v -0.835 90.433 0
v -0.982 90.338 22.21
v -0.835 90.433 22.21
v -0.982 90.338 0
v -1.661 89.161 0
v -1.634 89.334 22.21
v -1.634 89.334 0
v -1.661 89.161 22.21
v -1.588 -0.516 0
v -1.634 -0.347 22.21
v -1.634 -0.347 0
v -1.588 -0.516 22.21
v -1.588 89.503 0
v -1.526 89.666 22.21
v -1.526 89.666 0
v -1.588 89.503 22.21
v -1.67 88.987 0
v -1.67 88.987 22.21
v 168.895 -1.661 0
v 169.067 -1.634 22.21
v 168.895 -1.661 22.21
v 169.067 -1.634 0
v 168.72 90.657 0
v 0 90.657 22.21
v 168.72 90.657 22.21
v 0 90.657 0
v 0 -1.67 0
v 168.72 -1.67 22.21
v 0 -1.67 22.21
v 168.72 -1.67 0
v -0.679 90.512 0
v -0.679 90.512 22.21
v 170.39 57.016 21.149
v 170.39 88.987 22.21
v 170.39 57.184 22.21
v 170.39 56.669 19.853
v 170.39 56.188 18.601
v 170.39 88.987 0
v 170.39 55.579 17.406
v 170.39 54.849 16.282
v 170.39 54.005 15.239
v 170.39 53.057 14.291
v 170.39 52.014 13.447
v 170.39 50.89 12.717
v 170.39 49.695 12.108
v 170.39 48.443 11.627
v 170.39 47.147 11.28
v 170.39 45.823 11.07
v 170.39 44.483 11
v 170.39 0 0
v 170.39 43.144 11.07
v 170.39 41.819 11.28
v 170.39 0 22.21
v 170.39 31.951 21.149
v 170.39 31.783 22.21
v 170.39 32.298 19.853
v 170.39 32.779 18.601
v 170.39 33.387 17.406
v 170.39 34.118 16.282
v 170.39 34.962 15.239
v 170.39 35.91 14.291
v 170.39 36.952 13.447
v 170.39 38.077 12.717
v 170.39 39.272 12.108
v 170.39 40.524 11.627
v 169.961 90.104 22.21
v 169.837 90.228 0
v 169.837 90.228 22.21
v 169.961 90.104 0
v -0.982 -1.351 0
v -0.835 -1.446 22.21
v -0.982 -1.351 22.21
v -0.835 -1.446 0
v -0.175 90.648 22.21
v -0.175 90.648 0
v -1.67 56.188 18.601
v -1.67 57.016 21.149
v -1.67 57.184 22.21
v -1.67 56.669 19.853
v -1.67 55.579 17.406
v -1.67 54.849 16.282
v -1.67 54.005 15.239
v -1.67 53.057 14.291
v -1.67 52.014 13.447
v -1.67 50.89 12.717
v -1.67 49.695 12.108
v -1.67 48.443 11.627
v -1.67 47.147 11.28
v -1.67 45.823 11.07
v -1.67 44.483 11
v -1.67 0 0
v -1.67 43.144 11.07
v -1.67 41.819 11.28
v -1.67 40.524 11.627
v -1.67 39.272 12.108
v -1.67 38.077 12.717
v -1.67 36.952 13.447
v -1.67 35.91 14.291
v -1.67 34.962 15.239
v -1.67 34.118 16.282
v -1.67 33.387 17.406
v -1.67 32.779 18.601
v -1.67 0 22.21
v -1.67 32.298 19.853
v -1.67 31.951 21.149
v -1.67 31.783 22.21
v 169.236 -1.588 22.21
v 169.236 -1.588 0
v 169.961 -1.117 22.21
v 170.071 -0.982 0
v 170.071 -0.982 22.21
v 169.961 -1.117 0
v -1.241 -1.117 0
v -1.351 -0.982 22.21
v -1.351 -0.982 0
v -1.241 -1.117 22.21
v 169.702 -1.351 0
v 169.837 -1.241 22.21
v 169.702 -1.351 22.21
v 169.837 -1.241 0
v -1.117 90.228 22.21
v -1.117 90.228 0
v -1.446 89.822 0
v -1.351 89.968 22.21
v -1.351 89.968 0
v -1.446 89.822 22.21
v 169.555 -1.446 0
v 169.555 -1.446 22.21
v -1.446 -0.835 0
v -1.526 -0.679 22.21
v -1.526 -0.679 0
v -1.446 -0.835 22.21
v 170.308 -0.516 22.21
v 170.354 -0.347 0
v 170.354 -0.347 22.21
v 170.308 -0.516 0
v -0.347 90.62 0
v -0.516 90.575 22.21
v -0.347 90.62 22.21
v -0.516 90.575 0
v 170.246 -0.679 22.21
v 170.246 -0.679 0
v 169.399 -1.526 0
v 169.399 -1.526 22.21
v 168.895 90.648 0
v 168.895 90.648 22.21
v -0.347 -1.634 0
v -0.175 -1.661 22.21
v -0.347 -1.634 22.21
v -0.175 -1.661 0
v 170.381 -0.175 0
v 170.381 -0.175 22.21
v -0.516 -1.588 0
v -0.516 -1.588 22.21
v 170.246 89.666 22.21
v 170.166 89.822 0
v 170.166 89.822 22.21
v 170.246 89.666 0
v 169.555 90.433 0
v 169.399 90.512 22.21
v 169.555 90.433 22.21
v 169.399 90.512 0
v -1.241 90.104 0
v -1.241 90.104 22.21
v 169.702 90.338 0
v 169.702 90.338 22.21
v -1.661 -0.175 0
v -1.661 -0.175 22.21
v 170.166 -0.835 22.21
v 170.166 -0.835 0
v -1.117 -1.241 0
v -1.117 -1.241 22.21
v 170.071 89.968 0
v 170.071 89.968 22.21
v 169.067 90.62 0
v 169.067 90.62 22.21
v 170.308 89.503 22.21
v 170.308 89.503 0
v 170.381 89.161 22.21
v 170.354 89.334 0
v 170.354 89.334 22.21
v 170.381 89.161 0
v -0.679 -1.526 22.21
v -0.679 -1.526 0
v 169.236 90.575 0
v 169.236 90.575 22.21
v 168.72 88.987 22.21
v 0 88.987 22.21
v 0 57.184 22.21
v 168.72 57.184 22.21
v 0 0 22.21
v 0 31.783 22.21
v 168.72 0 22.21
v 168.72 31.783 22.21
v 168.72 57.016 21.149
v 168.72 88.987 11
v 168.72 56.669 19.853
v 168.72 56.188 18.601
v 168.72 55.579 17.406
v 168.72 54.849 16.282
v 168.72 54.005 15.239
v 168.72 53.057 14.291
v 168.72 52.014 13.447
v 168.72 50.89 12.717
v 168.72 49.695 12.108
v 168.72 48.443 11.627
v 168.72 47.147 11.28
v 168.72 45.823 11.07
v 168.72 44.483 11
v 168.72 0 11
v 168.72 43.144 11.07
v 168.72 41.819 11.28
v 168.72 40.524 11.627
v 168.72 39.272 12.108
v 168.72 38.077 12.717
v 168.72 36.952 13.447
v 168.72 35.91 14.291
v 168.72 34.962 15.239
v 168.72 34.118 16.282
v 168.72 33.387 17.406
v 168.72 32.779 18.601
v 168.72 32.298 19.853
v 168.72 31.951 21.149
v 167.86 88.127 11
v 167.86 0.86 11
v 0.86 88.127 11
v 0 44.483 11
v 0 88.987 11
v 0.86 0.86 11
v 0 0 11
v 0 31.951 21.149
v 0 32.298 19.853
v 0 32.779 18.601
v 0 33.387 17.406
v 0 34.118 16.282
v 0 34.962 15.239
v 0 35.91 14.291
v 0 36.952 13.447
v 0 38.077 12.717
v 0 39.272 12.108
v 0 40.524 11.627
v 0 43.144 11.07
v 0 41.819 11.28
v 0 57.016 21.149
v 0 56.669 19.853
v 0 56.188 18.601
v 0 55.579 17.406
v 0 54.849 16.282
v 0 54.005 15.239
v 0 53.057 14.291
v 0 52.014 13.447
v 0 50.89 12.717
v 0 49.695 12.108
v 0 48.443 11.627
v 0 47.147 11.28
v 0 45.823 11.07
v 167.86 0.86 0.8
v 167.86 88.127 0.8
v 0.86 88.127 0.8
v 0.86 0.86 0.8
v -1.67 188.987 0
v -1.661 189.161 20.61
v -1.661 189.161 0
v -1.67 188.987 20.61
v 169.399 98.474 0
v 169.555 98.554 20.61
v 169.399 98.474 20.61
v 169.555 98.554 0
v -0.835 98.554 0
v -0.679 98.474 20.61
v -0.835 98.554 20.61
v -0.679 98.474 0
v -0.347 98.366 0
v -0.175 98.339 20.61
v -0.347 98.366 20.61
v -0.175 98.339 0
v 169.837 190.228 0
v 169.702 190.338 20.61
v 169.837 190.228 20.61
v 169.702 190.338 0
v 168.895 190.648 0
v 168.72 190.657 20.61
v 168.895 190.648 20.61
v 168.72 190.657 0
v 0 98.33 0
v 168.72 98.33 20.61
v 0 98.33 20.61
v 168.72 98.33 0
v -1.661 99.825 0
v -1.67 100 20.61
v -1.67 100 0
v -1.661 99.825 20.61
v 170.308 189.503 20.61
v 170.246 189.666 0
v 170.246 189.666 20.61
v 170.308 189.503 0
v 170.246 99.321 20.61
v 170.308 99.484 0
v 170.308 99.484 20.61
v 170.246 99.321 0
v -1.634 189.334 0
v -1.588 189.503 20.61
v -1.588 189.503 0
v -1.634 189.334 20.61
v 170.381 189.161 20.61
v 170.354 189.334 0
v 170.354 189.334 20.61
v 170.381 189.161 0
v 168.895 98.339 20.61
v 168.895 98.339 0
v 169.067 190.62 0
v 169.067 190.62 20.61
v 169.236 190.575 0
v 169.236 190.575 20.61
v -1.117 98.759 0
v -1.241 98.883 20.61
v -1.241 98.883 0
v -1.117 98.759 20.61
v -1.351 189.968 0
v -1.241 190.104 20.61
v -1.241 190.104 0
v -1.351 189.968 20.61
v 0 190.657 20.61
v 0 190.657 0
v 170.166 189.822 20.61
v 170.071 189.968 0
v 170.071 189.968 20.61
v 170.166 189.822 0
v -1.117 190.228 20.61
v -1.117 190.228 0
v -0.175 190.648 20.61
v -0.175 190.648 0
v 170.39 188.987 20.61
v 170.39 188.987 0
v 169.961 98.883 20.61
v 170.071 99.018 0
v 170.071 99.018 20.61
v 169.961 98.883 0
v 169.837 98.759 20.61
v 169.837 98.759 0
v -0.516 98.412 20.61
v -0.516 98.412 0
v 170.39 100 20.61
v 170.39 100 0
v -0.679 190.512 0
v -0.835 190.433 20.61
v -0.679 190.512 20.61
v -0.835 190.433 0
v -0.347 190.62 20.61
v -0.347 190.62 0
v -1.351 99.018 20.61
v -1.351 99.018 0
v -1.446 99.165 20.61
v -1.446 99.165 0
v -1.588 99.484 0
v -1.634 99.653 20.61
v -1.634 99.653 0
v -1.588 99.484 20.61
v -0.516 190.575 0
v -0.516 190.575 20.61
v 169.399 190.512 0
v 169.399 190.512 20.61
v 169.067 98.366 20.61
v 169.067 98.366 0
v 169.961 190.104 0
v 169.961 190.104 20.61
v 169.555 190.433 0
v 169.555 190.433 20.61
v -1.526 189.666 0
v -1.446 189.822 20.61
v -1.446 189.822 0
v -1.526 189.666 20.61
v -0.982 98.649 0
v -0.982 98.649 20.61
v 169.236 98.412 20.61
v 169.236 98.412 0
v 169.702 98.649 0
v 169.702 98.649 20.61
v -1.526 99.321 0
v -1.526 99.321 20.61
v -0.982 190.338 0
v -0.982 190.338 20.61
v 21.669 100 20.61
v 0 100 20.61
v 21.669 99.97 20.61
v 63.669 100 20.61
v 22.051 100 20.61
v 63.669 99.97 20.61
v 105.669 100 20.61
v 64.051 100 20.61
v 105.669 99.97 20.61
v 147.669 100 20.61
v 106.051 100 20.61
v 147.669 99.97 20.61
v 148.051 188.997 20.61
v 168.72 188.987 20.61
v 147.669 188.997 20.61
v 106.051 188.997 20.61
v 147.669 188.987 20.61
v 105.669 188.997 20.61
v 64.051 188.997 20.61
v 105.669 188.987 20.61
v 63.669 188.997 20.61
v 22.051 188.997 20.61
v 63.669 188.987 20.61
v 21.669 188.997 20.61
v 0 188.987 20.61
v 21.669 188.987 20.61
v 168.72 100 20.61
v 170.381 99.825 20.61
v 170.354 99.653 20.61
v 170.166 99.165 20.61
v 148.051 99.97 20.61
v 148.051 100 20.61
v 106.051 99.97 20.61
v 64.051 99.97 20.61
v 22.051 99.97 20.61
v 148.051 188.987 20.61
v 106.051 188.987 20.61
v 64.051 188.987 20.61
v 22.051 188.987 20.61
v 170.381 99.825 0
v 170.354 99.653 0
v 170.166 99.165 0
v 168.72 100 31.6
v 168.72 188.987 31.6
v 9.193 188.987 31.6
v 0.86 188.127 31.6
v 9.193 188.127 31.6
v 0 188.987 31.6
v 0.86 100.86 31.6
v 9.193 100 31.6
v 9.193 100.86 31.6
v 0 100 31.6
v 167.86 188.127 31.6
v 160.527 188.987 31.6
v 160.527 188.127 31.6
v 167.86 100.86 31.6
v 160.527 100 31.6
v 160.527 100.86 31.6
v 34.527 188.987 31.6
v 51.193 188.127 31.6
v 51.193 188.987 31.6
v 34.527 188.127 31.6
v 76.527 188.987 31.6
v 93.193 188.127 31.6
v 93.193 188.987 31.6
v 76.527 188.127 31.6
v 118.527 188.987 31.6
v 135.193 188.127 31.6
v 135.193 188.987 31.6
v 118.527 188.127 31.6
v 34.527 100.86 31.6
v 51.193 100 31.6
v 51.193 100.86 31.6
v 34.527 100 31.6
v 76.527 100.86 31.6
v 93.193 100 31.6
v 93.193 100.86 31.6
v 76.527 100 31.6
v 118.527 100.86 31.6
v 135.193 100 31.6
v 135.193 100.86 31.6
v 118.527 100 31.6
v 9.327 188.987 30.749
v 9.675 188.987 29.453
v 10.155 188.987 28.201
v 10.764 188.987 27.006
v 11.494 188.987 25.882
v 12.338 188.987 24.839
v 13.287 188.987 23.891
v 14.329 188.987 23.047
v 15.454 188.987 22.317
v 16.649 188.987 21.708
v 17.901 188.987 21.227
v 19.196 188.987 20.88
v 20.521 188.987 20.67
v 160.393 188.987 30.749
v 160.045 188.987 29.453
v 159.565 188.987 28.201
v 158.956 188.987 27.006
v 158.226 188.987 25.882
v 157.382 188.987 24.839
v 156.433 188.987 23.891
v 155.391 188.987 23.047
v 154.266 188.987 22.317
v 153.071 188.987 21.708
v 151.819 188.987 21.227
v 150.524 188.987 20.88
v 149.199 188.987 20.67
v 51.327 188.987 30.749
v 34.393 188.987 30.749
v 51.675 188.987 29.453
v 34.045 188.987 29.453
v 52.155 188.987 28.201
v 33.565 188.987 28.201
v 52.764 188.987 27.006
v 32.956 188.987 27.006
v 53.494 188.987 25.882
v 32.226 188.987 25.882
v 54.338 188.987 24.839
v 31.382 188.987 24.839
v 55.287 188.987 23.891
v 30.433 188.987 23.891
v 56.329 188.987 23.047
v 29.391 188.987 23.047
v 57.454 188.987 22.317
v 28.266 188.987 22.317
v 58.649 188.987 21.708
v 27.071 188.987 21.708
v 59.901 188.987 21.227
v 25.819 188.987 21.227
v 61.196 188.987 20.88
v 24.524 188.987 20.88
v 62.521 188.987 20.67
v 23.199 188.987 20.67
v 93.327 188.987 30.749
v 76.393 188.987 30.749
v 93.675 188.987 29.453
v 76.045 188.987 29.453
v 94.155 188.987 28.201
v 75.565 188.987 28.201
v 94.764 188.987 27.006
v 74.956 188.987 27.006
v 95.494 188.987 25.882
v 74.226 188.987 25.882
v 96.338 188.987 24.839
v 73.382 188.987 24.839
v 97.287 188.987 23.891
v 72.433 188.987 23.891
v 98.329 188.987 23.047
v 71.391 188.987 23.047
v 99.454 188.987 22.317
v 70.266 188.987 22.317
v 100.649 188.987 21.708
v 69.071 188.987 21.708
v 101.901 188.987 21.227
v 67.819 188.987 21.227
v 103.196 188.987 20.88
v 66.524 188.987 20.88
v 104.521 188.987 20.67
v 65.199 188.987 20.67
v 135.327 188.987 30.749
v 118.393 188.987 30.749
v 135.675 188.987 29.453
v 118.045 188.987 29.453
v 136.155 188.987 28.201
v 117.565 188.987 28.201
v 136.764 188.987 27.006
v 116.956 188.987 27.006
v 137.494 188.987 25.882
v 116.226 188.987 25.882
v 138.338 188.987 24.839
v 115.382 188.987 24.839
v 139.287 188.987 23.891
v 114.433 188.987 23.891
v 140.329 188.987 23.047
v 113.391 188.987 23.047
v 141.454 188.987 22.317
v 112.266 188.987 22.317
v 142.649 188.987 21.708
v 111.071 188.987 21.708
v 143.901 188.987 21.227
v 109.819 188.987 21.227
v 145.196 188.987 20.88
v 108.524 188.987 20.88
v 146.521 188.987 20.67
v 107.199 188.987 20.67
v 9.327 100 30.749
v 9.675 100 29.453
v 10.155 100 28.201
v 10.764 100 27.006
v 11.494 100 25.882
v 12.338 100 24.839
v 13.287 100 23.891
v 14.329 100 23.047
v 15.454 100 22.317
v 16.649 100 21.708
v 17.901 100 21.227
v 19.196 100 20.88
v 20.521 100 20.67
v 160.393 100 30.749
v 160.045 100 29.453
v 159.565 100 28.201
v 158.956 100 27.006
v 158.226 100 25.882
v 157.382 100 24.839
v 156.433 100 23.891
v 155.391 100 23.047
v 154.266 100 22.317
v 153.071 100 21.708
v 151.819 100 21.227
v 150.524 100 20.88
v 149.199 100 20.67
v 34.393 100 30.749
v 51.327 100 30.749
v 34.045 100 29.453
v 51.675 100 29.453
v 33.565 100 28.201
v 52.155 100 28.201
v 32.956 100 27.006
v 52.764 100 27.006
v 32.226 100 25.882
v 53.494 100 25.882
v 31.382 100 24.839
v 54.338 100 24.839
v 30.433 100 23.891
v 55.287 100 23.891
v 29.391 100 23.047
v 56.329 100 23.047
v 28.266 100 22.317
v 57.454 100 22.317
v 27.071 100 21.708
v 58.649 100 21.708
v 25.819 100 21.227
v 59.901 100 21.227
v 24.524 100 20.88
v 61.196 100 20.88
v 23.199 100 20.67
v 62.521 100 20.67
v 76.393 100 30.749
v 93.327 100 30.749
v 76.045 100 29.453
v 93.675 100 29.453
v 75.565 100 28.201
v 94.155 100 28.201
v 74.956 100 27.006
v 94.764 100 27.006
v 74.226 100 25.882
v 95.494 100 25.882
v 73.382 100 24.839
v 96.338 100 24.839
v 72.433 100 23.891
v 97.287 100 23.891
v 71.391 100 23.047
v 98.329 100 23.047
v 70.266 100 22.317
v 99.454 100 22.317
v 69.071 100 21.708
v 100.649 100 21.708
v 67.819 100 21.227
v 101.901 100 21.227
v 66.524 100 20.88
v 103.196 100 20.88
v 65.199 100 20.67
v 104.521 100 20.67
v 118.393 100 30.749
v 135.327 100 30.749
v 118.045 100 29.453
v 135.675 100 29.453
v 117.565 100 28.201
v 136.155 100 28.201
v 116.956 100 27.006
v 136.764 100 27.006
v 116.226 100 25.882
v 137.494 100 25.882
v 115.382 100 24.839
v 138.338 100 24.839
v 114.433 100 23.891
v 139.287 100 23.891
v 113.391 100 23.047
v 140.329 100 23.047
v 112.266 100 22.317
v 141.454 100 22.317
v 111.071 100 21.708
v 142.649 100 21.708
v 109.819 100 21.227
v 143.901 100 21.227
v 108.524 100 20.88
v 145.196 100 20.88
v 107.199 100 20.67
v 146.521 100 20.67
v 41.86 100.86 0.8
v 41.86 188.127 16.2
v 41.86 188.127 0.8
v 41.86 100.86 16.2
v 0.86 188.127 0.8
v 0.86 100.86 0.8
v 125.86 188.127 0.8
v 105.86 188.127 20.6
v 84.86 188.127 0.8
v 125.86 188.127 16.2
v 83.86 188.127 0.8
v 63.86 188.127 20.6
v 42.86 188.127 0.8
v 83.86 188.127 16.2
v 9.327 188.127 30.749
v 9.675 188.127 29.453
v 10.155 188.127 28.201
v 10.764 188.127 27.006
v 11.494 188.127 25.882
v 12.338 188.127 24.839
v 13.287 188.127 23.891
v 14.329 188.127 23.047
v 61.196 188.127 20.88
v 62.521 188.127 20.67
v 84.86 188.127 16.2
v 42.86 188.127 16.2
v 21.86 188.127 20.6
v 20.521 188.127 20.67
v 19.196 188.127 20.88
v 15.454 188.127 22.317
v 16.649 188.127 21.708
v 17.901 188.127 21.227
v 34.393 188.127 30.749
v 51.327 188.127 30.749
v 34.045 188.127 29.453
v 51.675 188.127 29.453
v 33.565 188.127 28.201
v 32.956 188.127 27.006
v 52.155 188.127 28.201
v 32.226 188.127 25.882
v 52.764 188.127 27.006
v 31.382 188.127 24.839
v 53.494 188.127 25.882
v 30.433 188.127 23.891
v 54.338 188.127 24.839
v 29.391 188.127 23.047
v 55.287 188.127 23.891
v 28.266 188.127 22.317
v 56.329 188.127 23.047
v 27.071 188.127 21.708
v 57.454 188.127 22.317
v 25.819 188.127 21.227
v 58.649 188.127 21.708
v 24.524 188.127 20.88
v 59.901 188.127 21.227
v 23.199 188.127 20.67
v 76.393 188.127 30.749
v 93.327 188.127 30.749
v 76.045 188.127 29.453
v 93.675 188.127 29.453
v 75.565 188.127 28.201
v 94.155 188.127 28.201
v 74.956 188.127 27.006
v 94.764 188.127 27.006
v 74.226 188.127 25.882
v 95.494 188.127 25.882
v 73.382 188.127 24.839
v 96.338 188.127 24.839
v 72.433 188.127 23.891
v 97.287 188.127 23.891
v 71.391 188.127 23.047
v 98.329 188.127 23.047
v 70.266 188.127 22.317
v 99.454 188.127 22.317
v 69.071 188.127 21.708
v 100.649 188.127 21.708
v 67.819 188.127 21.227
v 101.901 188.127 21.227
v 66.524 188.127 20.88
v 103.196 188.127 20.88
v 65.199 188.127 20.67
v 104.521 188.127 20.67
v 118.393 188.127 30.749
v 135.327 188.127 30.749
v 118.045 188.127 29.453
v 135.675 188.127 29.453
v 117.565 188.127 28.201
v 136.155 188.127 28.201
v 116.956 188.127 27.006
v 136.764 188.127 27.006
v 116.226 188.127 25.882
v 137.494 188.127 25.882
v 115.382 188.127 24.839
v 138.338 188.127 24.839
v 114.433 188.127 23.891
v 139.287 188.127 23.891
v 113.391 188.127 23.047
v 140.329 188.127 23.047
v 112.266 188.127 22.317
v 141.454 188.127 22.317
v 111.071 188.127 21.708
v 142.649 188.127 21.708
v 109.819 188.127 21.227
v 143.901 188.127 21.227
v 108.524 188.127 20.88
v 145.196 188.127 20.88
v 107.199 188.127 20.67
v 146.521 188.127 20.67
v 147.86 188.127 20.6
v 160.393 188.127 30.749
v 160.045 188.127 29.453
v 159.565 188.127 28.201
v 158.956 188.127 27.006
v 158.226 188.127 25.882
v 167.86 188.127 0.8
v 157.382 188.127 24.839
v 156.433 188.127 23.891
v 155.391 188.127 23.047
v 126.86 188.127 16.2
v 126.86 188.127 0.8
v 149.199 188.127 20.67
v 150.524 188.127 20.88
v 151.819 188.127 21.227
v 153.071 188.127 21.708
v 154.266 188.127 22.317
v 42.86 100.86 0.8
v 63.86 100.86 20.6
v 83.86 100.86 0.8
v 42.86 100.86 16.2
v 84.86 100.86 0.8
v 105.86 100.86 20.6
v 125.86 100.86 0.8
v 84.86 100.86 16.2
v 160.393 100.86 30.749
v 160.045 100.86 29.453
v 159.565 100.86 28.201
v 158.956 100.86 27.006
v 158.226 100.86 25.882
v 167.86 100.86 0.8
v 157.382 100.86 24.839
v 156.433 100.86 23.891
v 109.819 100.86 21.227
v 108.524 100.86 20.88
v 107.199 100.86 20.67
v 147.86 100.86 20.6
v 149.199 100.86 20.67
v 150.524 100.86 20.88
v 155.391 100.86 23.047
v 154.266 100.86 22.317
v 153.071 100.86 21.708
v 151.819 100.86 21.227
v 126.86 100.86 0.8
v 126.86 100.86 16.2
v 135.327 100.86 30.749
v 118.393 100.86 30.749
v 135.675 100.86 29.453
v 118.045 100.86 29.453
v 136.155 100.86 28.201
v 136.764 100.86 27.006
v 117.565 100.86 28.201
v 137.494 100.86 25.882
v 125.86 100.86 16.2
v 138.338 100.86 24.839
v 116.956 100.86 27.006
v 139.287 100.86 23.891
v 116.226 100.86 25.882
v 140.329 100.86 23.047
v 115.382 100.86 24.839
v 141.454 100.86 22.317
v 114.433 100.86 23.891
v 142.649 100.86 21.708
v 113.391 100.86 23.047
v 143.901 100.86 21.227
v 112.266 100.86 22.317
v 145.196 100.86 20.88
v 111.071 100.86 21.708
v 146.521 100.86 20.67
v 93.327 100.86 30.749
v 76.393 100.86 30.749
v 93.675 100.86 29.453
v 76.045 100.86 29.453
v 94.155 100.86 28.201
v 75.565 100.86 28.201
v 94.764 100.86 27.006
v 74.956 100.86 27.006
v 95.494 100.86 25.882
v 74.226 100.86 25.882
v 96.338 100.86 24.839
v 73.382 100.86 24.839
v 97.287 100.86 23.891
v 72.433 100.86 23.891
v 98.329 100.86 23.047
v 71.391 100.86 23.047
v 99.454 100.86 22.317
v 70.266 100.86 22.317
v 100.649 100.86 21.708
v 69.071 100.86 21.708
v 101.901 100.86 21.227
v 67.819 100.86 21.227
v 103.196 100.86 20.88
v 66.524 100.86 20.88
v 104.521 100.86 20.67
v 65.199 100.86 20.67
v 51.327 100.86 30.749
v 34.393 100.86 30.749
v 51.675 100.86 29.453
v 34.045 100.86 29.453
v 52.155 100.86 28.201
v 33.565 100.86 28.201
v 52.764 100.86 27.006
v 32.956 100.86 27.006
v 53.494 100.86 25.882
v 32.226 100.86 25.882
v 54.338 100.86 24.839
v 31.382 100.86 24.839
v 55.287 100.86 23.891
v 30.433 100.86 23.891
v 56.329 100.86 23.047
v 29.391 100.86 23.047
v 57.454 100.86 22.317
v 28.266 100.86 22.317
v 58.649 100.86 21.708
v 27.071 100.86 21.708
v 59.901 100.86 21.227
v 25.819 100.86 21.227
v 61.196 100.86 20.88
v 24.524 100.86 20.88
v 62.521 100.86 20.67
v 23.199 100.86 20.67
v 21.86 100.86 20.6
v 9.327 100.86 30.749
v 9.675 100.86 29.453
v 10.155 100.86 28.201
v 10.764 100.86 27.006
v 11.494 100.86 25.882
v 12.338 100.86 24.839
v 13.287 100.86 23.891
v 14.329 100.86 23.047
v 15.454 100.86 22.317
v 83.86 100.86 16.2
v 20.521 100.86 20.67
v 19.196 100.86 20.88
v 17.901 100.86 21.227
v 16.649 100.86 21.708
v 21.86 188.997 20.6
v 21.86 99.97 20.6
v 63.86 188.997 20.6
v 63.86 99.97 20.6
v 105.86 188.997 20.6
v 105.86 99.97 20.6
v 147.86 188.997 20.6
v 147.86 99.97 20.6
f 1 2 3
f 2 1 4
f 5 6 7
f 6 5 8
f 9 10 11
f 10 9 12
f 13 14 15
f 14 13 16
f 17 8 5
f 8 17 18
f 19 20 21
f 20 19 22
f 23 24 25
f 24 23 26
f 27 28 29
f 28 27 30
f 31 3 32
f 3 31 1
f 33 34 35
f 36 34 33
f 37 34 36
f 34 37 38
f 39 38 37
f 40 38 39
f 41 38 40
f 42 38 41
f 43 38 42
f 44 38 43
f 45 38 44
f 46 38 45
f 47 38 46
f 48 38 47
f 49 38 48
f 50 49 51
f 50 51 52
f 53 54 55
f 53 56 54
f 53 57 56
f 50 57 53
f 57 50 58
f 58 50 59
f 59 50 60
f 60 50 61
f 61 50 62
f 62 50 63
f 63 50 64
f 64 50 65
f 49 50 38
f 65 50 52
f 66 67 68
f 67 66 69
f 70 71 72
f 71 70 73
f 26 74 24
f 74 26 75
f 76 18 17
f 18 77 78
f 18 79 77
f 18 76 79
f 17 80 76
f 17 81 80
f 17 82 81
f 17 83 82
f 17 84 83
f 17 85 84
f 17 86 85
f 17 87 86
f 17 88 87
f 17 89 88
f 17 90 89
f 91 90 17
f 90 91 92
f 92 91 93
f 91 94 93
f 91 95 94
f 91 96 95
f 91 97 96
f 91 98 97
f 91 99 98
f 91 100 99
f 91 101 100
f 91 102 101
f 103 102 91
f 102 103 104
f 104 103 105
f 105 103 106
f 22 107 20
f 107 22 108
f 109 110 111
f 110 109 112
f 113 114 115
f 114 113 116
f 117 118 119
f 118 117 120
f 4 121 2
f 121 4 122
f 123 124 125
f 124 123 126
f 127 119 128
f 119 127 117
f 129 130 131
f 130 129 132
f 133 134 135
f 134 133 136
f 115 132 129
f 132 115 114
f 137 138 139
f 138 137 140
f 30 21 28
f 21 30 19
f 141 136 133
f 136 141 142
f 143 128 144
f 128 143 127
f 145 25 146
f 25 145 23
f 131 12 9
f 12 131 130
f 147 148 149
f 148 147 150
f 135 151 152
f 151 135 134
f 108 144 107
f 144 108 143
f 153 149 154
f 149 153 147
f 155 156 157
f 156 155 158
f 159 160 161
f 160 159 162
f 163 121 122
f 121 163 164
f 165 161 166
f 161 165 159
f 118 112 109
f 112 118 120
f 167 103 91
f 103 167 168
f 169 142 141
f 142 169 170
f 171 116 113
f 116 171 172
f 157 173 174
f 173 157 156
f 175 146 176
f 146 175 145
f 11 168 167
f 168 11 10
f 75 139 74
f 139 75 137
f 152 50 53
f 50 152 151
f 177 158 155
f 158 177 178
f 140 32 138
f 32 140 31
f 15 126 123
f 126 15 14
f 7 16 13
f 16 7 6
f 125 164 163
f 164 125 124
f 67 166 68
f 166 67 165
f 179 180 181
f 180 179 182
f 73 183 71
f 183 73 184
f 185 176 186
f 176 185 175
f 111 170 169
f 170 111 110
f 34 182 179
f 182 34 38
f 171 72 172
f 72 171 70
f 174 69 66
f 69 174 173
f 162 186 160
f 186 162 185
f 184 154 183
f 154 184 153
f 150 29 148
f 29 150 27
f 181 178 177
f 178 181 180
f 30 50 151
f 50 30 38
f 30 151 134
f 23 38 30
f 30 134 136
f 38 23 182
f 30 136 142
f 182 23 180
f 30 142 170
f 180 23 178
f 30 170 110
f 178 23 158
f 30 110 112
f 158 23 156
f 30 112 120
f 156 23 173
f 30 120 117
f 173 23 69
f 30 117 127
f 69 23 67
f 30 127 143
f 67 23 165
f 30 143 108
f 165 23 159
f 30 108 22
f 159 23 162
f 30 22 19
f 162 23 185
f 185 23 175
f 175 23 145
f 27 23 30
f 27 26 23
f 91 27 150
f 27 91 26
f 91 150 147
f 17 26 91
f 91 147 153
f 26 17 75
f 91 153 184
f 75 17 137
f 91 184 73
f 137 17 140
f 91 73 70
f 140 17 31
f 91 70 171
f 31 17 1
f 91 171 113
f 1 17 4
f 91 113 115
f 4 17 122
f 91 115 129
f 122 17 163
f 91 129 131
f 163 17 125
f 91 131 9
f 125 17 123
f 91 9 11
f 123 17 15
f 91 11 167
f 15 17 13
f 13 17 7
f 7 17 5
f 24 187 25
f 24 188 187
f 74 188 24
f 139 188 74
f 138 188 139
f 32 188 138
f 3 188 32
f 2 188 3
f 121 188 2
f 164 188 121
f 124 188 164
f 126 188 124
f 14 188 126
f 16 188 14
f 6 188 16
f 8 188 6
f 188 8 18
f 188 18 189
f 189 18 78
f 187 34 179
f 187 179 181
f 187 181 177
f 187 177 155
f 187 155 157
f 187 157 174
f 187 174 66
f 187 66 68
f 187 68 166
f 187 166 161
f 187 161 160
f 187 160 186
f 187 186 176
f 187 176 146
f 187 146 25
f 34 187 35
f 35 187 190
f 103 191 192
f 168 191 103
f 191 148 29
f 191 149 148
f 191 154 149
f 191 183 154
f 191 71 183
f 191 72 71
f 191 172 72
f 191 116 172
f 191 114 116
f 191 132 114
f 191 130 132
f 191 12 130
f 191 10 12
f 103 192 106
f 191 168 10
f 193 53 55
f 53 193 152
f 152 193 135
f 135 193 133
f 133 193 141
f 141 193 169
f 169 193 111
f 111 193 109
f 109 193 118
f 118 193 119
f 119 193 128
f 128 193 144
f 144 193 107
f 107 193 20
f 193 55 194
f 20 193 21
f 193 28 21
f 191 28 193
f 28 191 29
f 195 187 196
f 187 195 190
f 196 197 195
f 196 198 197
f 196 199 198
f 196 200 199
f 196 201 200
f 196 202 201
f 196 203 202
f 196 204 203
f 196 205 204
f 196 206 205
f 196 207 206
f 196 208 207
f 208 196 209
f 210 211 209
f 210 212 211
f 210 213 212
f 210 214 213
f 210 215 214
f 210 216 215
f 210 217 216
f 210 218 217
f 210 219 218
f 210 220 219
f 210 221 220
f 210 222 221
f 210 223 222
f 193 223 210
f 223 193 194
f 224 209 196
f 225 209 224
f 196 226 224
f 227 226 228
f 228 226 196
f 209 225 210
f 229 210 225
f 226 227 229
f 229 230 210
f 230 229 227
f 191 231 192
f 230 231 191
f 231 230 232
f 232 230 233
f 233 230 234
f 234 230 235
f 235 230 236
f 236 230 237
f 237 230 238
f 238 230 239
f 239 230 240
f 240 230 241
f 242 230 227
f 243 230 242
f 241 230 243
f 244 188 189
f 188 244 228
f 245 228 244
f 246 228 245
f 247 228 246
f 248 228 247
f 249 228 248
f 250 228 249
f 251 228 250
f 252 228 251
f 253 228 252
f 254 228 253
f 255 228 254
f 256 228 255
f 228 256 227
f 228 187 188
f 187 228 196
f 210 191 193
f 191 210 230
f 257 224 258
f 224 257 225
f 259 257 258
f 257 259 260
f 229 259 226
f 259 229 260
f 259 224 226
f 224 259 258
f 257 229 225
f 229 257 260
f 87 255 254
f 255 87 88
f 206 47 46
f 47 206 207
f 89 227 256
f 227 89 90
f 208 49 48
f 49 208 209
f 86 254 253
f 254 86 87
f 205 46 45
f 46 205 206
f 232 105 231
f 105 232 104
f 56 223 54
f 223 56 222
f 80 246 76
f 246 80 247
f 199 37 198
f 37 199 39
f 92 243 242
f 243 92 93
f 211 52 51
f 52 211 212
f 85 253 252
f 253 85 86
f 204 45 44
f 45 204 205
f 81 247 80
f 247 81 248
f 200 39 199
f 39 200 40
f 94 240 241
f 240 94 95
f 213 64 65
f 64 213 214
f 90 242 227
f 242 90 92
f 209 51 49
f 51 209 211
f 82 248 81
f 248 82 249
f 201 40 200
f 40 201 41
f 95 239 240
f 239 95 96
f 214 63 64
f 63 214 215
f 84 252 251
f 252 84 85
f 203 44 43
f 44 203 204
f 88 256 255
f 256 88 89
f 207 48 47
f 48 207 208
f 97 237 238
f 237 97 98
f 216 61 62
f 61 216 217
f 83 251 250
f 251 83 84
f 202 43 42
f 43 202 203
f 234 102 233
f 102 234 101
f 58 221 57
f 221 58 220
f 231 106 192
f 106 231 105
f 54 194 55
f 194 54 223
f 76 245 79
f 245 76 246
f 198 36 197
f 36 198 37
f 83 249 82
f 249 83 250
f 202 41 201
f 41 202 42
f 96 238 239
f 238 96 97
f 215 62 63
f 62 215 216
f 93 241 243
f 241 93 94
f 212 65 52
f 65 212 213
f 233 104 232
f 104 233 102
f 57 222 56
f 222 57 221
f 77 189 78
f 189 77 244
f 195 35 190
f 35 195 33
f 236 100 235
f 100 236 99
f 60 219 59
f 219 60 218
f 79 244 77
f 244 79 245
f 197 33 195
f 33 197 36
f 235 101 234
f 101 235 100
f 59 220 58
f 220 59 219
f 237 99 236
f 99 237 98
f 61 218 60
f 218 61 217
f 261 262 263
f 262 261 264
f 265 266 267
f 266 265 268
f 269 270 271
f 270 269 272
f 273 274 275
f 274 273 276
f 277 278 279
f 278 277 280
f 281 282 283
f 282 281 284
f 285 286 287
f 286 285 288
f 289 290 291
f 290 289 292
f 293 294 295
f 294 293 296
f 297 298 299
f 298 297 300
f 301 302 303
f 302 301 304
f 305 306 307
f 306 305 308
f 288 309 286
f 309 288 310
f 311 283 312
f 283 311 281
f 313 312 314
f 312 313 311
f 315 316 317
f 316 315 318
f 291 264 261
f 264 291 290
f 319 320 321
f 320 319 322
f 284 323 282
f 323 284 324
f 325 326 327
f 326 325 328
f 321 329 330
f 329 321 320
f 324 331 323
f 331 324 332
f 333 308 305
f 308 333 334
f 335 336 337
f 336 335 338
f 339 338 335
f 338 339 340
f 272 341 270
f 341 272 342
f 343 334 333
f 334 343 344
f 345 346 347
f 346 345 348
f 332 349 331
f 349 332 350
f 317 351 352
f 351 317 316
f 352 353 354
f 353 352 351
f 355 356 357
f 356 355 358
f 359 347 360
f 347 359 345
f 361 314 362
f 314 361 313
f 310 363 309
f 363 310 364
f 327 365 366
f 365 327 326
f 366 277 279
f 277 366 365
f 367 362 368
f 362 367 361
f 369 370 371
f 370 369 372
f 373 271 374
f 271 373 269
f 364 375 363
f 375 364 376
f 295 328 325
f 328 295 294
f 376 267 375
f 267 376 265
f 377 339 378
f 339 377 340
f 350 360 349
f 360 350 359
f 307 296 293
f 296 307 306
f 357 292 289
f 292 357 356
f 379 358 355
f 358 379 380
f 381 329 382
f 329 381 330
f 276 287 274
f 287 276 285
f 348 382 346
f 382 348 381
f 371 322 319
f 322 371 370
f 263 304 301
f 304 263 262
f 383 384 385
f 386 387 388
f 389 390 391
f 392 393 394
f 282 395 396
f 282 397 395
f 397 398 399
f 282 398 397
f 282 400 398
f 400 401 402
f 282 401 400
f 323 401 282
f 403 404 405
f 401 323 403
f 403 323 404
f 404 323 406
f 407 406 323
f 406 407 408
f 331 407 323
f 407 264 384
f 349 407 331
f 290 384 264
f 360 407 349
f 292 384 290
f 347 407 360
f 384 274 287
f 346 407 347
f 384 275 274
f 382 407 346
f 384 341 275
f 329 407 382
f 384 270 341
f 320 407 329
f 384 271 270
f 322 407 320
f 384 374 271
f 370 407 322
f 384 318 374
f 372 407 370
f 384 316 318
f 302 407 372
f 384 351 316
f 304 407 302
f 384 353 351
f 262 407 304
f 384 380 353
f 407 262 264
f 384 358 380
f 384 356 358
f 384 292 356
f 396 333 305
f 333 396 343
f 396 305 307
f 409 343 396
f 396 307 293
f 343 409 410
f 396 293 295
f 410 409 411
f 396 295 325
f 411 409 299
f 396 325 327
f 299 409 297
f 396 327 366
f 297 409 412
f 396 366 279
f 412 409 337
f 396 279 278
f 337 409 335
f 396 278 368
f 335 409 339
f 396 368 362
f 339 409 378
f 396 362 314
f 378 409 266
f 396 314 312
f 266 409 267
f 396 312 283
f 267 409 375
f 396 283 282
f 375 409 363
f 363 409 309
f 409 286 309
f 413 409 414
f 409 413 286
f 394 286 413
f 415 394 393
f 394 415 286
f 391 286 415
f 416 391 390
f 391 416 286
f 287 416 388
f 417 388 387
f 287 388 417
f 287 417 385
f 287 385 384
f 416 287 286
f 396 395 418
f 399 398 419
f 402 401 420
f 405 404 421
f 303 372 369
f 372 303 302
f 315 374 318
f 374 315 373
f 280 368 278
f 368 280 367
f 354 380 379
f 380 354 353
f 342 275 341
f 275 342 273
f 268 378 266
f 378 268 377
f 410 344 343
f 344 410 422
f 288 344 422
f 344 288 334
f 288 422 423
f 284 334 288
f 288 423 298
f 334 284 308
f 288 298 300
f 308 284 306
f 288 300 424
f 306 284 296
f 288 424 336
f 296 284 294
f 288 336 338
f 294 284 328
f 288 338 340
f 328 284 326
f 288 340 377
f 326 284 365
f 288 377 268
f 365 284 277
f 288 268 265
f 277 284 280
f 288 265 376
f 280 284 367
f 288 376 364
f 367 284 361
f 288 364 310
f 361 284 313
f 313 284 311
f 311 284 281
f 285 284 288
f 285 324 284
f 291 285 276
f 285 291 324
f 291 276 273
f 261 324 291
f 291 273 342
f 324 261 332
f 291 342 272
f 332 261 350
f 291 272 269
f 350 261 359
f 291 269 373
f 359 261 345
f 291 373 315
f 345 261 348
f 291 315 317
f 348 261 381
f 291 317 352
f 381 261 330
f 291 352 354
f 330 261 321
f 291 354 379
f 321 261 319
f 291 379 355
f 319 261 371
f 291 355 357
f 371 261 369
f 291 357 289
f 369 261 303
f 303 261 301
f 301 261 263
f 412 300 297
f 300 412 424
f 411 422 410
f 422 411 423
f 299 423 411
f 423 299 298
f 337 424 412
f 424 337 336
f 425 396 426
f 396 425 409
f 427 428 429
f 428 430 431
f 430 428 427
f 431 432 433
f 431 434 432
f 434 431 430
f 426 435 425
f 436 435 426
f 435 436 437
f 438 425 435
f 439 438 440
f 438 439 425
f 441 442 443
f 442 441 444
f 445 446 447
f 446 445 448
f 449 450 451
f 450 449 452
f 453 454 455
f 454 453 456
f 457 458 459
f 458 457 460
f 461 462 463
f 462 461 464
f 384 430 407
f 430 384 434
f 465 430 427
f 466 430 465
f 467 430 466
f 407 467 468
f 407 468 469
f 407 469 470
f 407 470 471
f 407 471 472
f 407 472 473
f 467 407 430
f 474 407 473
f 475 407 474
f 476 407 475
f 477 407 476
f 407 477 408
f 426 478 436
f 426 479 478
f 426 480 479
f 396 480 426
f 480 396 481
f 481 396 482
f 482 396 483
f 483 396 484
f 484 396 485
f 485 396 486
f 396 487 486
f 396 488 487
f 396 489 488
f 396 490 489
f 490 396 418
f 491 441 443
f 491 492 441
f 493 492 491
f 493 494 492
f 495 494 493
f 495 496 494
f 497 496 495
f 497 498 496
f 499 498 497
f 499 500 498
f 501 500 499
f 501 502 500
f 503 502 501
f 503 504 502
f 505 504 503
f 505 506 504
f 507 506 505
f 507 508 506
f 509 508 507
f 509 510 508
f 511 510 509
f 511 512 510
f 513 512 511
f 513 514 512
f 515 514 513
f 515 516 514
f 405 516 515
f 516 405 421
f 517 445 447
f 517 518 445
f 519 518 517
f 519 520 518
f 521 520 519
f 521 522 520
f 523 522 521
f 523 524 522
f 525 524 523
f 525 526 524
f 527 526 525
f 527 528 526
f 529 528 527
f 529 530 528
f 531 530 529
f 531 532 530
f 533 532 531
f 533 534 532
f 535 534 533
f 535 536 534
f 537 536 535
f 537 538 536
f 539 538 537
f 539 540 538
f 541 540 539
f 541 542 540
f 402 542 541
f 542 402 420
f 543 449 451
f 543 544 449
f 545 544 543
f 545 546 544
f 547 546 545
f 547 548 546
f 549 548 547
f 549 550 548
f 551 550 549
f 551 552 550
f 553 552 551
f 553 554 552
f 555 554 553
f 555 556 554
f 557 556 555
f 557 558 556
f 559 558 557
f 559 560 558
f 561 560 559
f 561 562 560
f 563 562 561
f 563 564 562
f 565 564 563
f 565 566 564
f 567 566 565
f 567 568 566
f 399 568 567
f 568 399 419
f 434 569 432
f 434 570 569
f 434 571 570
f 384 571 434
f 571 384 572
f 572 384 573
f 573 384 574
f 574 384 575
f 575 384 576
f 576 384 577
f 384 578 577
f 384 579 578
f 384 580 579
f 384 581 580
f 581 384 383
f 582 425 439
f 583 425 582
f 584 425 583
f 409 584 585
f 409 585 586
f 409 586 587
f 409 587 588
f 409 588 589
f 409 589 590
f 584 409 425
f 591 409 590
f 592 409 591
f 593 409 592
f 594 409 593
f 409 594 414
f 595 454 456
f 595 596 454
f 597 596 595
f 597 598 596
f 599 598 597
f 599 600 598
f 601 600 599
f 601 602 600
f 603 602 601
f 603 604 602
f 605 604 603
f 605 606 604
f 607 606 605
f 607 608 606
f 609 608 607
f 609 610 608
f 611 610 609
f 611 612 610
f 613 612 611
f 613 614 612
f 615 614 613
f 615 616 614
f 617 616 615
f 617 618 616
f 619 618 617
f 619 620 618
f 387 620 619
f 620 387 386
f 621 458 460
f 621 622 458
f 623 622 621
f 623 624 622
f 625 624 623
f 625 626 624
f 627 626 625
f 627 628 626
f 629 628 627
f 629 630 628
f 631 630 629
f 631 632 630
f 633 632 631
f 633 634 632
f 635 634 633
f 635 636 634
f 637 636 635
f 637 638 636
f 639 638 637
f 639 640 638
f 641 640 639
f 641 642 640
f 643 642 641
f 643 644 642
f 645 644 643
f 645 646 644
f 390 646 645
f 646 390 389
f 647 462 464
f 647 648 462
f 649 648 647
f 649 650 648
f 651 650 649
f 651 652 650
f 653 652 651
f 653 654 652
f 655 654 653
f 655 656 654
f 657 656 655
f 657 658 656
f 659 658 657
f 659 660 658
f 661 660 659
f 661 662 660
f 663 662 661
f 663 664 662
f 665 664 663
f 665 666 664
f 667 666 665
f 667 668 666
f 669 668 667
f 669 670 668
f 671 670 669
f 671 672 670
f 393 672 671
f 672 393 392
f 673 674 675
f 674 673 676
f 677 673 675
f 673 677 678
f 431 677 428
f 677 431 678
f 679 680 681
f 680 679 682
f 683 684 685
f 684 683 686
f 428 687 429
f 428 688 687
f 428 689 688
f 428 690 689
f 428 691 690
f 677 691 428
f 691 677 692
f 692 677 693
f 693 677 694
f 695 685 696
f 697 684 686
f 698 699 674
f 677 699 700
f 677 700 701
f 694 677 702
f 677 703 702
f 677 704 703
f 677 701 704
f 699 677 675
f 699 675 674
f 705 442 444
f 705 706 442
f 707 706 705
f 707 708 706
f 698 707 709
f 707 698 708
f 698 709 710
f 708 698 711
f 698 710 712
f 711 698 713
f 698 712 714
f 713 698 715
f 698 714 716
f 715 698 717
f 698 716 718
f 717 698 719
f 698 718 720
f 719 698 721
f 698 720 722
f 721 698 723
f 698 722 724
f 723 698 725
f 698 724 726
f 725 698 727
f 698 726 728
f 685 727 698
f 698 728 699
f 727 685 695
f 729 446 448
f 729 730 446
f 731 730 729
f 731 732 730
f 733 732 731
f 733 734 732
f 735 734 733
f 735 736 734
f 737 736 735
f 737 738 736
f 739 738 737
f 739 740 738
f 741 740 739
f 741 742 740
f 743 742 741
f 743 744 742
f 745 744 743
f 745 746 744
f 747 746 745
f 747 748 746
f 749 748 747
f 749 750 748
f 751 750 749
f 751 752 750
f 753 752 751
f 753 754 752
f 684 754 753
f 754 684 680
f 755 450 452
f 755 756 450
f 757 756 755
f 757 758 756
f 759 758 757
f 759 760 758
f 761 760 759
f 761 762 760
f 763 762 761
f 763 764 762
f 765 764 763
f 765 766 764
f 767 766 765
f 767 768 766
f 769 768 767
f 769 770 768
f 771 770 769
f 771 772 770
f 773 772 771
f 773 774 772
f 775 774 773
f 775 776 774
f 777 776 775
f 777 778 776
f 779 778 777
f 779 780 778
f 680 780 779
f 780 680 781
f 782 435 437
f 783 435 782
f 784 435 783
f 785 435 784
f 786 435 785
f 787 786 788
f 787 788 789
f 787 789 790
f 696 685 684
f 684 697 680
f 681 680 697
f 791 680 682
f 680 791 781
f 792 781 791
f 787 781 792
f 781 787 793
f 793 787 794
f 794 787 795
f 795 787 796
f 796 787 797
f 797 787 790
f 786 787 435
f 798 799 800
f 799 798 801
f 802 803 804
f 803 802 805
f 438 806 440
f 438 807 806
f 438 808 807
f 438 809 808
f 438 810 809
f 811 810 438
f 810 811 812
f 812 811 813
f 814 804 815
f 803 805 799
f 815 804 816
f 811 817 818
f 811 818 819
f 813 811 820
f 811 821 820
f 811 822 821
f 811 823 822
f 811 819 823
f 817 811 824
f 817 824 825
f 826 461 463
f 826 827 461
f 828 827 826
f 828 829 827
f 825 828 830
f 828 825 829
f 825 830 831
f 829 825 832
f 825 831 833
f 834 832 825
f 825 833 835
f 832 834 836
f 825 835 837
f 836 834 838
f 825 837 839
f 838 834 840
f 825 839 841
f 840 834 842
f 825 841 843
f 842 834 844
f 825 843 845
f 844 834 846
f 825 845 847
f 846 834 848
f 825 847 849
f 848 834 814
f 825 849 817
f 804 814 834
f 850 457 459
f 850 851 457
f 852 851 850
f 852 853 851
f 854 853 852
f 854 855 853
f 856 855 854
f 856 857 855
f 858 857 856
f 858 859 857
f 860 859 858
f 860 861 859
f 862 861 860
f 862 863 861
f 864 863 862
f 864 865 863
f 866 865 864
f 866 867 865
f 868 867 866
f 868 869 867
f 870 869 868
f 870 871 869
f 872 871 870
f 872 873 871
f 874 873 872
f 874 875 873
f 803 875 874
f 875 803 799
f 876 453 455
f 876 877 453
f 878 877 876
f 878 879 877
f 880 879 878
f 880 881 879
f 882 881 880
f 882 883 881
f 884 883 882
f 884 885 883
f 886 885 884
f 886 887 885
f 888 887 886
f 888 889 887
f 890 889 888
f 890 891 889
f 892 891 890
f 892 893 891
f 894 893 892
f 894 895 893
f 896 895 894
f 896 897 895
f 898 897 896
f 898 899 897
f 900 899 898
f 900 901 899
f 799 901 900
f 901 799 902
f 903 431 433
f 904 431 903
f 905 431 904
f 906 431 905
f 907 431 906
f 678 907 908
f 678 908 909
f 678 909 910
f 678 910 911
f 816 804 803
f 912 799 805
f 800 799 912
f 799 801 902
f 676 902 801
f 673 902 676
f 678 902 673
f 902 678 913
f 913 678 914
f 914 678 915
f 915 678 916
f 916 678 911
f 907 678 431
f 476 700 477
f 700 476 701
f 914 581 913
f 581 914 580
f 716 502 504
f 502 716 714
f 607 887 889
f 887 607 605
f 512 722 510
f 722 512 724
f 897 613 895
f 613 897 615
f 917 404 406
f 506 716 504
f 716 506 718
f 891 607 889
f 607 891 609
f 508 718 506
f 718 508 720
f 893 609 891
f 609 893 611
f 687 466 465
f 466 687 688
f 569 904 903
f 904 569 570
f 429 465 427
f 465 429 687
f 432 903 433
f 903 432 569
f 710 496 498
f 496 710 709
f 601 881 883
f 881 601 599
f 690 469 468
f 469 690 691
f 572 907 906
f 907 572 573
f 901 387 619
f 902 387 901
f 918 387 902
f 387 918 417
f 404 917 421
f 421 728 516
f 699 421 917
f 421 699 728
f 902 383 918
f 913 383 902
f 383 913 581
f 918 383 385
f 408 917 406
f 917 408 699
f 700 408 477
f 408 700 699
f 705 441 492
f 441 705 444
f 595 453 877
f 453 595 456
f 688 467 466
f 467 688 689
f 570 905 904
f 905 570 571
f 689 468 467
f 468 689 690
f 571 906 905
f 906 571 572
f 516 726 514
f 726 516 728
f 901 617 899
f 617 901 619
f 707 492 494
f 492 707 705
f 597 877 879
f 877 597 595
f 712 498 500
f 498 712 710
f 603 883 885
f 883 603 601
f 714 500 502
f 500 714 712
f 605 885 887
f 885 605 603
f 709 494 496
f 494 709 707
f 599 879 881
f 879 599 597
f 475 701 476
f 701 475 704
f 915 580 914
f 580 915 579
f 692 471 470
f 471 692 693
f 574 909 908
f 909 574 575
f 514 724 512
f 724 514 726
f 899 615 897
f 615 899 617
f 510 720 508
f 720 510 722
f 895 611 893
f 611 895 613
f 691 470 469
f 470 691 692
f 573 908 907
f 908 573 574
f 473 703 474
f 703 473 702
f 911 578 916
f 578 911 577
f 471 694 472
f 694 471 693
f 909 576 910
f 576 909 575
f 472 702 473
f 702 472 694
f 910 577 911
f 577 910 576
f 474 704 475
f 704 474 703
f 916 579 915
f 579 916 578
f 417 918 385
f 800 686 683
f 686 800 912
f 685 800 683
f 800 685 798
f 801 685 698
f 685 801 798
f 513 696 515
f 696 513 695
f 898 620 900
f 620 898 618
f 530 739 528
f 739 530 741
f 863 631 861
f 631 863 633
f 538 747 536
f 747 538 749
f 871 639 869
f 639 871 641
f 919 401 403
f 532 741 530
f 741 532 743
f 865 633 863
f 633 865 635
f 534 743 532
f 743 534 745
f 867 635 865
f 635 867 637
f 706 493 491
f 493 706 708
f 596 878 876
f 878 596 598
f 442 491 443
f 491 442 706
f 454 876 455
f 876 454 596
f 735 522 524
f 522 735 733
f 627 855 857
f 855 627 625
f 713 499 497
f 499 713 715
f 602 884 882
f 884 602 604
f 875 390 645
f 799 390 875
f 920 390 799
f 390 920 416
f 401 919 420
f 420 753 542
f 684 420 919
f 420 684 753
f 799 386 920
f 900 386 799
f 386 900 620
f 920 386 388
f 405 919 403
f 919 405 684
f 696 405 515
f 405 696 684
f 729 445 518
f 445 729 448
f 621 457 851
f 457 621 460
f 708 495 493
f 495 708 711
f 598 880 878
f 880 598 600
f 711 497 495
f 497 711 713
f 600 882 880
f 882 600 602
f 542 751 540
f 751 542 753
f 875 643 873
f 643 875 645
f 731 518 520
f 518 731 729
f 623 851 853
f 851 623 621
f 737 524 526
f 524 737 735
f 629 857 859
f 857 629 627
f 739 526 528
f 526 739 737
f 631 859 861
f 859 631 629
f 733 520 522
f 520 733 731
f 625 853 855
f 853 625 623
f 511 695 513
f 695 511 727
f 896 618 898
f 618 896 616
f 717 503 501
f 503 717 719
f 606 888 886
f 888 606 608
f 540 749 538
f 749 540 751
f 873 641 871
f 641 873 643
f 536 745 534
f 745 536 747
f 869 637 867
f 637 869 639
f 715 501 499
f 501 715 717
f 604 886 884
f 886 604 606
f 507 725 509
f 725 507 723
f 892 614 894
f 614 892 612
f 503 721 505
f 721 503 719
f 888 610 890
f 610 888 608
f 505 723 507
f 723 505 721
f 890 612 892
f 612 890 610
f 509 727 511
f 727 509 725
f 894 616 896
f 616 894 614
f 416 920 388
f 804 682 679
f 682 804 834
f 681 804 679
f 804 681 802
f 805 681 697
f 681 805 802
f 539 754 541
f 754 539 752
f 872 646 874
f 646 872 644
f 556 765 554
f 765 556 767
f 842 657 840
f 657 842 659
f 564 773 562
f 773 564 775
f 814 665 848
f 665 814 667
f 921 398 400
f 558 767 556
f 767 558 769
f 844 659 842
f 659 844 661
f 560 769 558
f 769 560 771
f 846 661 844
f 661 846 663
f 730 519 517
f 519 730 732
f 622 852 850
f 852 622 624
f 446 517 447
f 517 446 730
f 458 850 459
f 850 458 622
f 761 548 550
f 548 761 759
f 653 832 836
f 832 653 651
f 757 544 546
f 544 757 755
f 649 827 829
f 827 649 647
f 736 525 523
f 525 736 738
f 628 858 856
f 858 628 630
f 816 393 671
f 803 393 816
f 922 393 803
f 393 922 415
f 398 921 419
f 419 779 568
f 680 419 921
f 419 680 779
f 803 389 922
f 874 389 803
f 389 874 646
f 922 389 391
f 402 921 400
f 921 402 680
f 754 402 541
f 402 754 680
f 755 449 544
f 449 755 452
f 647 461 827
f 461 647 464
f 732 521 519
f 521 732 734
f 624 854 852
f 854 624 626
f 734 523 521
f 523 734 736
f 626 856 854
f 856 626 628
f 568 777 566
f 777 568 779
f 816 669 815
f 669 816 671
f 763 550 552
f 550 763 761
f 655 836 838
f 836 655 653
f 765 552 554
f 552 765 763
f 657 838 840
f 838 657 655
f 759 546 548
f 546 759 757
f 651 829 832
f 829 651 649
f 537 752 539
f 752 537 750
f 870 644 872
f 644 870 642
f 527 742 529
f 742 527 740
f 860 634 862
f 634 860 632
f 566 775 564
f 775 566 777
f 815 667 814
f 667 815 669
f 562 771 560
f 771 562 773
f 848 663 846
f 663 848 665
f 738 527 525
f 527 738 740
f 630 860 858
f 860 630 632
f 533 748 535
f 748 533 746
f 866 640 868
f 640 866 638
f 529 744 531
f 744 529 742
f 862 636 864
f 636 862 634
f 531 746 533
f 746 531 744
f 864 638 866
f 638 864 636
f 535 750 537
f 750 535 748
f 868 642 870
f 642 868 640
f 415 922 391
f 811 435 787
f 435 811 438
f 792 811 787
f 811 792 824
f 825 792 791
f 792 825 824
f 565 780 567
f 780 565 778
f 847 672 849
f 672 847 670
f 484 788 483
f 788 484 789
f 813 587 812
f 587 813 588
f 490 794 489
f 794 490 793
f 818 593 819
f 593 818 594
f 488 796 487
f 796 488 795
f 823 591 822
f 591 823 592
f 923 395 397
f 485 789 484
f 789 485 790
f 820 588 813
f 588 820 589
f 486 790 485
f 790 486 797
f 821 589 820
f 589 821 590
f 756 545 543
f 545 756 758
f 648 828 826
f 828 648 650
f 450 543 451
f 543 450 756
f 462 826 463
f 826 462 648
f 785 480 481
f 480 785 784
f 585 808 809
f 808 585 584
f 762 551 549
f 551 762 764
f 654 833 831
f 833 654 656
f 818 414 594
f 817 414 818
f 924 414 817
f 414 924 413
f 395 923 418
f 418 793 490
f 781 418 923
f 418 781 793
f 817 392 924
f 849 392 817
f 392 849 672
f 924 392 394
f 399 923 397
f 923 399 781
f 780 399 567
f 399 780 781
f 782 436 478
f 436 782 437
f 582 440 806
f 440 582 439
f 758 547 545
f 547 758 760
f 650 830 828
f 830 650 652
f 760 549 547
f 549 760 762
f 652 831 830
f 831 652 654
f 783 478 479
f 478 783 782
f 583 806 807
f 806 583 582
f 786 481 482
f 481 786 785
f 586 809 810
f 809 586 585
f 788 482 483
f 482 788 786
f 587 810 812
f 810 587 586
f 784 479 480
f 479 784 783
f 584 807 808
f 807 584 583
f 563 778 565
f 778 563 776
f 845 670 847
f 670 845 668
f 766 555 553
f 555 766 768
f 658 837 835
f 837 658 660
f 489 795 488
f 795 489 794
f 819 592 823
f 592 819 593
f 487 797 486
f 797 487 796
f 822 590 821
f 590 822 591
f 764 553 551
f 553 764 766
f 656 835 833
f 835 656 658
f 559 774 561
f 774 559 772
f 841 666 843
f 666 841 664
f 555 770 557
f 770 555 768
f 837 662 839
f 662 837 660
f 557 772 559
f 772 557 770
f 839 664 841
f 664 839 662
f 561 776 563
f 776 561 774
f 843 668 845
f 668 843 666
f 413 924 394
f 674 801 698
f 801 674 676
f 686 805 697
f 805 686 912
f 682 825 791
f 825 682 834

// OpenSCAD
// Poker Chip trays
//
// by W. Craig Trader is dual-licensed under 
// Creative Commons Attribution-ShareAlike 3.0 Unported License and
// GNU Lesser GPL 3.0 or later.
//
// ----------------------------------------------------------------------------

include <MCAD/units.scad>;

// ----- Command Line Arguments -----------------------------------------------

PART = "other";     // Which part to output
VERBOSE = true;     // Set to true to see more data

// ----- Component measurements -----------------------------------------------

ECLIPSE = [
    3.30*mm,        // Chip Thickness
    40.10*mm,       // Chip Diameter
    25,             // Chips per Row
    4,              // Rows per Rack
];

CUSTOM = [
    3.38*mm,        // Chip Thickness
    40.00*mm,       // Chip Diameter
    25,             // Chips per Row
    4,              // Rows per Rack
];

STANDARD_14G = [
    3.40*mm,        // Chip Thickness
    41.00*mm,       // Chip Diameter
    25,             // Chips per Row
    4,              // Rows per Rack
];


// ----- Physical dimensions --------------------------------------------------

THIN_WALL = 0.86 * mm;  // Based on 0.20mm layer height (2 lines)
WIDE_WALL = 1.67 * mm;  // Based on 0.20mm layer height (4 lines)
SLICING   = 0.20 * mm;  // Preferred slicing thickness;

SPACING =  1.0 * mm;    // Room for tiles to shift
GAP  = 0.25 * mm;       // Size differential between box and lid, for snug fit

OVERLAP = 0.01 * mm;    // Ensures that there are no vertical artifacts leftover

// ----- Calculated Measurements ----------------------------------------------

BOTTOM = 4 * SLICING;
INNER = THIN_WALL;
OUTER = WIDE_WALL;

$fa=4; $fn=60;

// ----- Sizing Functions -----------------------------------------------------

function optimized_slice( thickness ) = round( thickness / SLICING ) * SLICING;
function cutout( diameter ) = 5/8 * diameter;
function divider( diameter ) = optimized_slice(3/8 * diameter);
function lip( diameter ) = optimized_slice(1/2 * diameter);

// ----- Components -----------------------------------------------------------

module chip_tray( parameters ) {
    thickness = parameters[0];
    diameter  = parameters[1];
    chips     = parameters[2];
    rows      = parameters[3];
    
    inner_x = rows * diameter + (rows-1) * SPACING;
    inner_y = chips * thickness + 2/3 * thickness;
    inner_z = optimized_slice( diameter * 3/4 );
    
    outer_x = inner_x + 2*INNER;
    outer_y = inner_y + 2*INNER;
    outer_z = inner_z + BOTTOM;
    
    div_z = divider( diameter );
    lip_z = lip( diameter );
    cut_r = cutout( diameter/2 );
    cut_z = lip_z + cut_r;
    
    if (VERBOSE) {
        echo (TrayParameters=parameters);
        echo (TrayInnerX=inner_x, TrayInnerY=inner_y, TrayInnerZ=inner_z);
        echo (TrayOuterX=outer_x, TrayOuterY=outer_y, TrayOuterZ=outer_z);
        echo (TrayBorderX=outer_x+2*OUTER, TrayBorderY=outer_y+2*OUTER);
        echo (DividerHeight=div_z, LipHeight=lip_z, CutHeight=cut_z, CutRadius=cut_r);
    }
    
    difference() {
        // Outside of box
        union() {
            minkowski() {
                cube( [outer_x, outer_y, lip_z] );
                cylinder( r=OUTER, h=OVERLAP );
            }
            cube( [ outer_x, outer_y, outer_z] );
        }
        
        // Remove all space above dividers
        translate( [ INNER, INNER, BOTTOM+div_z ] ) cube ( [ inner_x, inner_y, inner_z+OVERLAP ] );
        
        // For each row
        for (row=[0:rows-1]) {
            sx = row * (diameter+SPACING) + INNER;
            tx = sx + (diameter+SPACING) / 2;
            
            // Remove space for chips below dividers
            translate( [ sx, INNER, BOTTOM ] ) cube( [ diameter, inner_y, inner_z+ OVERLAP ] );
            
            // Remove thumb holes for chips
            translate( [ tx, outer_y/2-OVERLAP, cut_z ] ) rotate( [90, 0, 0] ) cylinder( h=outer_y+4*OVERLAP, r=cut_r, center=true );
        }
    }
}


module chip_lid( parameters ) {
    thickness = parameters[0];
    diameter  = parameters[1];
    chips     = parameters[2];
    rows      = parameters[3];
    
    lip_z = lip( diameter / 2 );
    
    inner_x = rows * diameter + (rows-1) * SPACING;
    inner_y = chips * thickness + 2/3 * thickness;
    inner_z = optimized_slice( diameter * 1/4 + SPACING);
    
    outer_x = inner_x + 2*INNER;
    outer_y = inner_y + 2*INNER;
    outer_z = inner_z + lip_z + BOTTOM; //  inner_z + BOTTOM;
    
    cut_r = cutout( diameter/2 );
    cut_z = outer_z - inner_z + cut_r;

    if (VERBOSE) {
        echo (LidParameters=parameters);
        echo (LidInnerX=inner_x, LidInnerY=inner_y, LidInnerZ=inner_z);
        echo (LidOuterX=outer_x, LidOuterY=outer_y, LidOuterZ=outer_z);
        echo (LidBorderX=outer_x+2*OUTER, LidBorderY=outer_y+2*OUTER);
        echo (LipHeight=lip_z, CutHeight=cut_z, CutRadius=cut_r);
    }
    
    difference() {
        // Outside of box
        minkowski() {
            cube( [outer_x, outer_y, outer_z] );
            cylinder( r=OUTER, h=OVERLAP );
        }
        
        // Remove all space above lip
        translate( [0, 0, outer_z-inner_z] ) cube( [outer_x, outer_y, outer_z] );
        
        // Remove inner space
        translate( [INNER, INNER, BOTTOM] ) cube( [inner_x, inner_y, outer_z] );
        
        // Remove thumb holes
        translate( [ outer_x/2-OVERLAP, outer_y/2-OVERLAP, cut_z ] ) rotate( [0, 90, 0] ) cylinder( h=outer_x+2*OUTER+4*OVERLAP, r=cut_r, center=true );
    }
}

// ----- Render Logic for makefile --------------------------------------------

module place( translation=[0,0,0], angle=0, hue="" ) {
	for (i = [0 : $children-1]) {
		translate( translation ) 
			rotate( a=angle ) 
				if ( hue != "" ) {
					color( hue ) children(i);
				} else {
					children(i);
				}
	}
}

if (VERBOSE) {
	echo (Part=PART);
}

if (PART == "14g-tray") {
    chip_tray( STANDARD_14G );
} else if (PART == "14g-lid") {
    chip_lid( STANDARD_14G );
} else if (PART == "eclipse-tray") {
    chip_tray( ECLIPSE );
} else if (PART == "eclipse-lid") {
    chip_lid( ECLIPSE );
} else {
    place( [0,  0,0] ) chip_lid( STANDARD_14G );
    place( [0,100,0] ) chip_tray( STANDARD_14G );
}
